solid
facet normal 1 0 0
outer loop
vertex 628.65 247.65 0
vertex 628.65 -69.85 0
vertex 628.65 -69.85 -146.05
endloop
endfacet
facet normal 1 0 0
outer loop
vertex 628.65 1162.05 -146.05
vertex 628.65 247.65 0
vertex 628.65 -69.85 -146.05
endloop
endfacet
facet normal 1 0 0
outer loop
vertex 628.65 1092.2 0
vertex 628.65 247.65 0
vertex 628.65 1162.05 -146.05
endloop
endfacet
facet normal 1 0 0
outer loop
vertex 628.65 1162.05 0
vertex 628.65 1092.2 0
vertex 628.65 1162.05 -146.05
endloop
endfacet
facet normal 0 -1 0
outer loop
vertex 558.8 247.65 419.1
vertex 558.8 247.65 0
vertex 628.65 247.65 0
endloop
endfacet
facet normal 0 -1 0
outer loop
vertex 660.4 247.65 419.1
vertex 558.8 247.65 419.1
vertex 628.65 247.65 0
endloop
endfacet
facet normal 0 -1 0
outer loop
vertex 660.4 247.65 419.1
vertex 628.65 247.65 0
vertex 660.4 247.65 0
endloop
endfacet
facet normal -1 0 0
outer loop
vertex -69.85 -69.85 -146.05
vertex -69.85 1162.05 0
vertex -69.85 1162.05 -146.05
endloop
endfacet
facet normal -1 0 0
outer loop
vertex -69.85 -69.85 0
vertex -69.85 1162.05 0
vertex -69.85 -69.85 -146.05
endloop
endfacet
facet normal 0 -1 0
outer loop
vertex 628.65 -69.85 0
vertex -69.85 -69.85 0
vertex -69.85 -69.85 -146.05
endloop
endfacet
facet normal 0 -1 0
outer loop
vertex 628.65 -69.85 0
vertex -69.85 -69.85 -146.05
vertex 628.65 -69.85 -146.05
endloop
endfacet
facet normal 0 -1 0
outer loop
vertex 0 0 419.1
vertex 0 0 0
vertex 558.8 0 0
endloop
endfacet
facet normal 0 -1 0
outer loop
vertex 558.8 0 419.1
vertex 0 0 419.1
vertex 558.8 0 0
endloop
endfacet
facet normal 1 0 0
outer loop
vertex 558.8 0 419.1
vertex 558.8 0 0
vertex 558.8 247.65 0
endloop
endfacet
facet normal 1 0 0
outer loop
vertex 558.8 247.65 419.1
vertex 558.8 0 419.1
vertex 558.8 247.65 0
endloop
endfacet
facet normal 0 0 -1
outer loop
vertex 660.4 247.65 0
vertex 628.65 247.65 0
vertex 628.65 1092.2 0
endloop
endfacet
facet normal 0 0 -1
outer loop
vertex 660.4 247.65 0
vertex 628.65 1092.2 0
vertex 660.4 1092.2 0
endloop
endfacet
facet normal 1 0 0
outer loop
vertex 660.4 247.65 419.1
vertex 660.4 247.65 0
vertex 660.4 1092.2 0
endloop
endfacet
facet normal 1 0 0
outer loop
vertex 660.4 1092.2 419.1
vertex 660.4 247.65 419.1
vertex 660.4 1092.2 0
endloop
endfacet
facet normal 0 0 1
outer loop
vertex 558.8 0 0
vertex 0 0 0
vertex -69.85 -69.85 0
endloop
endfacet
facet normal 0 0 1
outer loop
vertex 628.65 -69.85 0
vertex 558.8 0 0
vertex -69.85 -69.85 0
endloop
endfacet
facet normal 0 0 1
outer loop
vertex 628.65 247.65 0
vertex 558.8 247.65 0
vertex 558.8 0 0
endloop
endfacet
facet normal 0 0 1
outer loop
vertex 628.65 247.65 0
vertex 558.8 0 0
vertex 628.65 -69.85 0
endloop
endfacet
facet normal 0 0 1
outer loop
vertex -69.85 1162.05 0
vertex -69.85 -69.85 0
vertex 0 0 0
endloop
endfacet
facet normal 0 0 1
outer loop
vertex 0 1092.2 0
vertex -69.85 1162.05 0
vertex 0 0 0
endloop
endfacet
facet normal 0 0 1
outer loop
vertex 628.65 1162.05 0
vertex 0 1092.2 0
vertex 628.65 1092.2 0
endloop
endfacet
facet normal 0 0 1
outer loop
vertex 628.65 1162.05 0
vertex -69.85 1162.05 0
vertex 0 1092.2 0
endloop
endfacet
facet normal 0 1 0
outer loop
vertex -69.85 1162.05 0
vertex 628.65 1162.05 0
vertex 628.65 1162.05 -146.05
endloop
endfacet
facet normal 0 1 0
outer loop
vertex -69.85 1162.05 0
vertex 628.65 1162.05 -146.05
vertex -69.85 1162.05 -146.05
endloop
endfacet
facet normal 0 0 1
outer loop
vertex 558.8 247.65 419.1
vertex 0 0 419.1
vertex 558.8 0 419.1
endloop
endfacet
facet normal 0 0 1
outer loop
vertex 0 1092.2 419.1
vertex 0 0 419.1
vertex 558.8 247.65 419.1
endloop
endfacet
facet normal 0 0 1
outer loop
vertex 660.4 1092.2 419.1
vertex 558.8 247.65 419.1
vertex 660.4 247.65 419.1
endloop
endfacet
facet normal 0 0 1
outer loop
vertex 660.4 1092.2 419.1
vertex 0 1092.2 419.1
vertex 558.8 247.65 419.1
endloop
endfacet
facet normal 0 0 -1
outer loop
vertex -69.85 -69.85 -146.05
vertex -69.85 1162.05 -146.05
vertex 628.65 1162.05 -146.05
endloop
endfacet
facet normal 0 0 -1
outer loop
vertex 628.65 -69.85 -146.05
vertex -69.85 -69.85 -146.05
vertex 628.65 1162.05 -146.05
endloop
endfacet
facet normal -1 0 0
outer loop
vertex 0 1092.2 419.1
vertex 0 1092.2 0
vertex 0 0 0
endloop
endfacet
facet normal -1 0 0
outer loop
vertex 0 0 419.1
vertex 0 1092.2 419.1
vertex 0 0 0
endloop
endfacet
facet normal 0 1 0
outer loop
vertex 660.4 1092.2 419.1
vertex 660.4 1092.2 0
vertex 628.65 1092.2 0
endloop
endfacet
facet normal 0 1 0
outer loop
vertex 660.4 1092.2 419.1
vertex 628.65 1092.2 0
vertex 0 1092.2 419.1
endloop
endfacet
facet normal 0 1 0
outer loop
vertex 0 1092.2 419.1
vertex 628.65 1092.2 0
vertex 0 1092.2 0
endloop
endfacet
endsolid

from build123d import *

# Parameters (mm, degrees)
F1_DEPTH = 419.1
F3_DEPTH = 146.05


with BuildPart() as f1:
    # F0 (on Top) → F1 (new body)
    with BuildSketch(Plane.XY):
        Polygon((0, 1092.2), (0, 0), (558.8, 0), (558.8, 247.65), (660.4, 247.65), (660.4, 1092.2), (558.8, 1092.2), align=None)
    extrude(amount=F1_DEPTH)

    # F2 (on Top) → F3 (join)
    with BuildSketch(Plane.XY):
        Polygon((628.65, 1162.05), (-69.85, 1162.05), (-69.85, -69.85), (628.65, -69.85), (628.65, 133.35), (628.65, 958.85), align=None)
    extrude(amount=-F3_DEPTH)


solid = f1.part
